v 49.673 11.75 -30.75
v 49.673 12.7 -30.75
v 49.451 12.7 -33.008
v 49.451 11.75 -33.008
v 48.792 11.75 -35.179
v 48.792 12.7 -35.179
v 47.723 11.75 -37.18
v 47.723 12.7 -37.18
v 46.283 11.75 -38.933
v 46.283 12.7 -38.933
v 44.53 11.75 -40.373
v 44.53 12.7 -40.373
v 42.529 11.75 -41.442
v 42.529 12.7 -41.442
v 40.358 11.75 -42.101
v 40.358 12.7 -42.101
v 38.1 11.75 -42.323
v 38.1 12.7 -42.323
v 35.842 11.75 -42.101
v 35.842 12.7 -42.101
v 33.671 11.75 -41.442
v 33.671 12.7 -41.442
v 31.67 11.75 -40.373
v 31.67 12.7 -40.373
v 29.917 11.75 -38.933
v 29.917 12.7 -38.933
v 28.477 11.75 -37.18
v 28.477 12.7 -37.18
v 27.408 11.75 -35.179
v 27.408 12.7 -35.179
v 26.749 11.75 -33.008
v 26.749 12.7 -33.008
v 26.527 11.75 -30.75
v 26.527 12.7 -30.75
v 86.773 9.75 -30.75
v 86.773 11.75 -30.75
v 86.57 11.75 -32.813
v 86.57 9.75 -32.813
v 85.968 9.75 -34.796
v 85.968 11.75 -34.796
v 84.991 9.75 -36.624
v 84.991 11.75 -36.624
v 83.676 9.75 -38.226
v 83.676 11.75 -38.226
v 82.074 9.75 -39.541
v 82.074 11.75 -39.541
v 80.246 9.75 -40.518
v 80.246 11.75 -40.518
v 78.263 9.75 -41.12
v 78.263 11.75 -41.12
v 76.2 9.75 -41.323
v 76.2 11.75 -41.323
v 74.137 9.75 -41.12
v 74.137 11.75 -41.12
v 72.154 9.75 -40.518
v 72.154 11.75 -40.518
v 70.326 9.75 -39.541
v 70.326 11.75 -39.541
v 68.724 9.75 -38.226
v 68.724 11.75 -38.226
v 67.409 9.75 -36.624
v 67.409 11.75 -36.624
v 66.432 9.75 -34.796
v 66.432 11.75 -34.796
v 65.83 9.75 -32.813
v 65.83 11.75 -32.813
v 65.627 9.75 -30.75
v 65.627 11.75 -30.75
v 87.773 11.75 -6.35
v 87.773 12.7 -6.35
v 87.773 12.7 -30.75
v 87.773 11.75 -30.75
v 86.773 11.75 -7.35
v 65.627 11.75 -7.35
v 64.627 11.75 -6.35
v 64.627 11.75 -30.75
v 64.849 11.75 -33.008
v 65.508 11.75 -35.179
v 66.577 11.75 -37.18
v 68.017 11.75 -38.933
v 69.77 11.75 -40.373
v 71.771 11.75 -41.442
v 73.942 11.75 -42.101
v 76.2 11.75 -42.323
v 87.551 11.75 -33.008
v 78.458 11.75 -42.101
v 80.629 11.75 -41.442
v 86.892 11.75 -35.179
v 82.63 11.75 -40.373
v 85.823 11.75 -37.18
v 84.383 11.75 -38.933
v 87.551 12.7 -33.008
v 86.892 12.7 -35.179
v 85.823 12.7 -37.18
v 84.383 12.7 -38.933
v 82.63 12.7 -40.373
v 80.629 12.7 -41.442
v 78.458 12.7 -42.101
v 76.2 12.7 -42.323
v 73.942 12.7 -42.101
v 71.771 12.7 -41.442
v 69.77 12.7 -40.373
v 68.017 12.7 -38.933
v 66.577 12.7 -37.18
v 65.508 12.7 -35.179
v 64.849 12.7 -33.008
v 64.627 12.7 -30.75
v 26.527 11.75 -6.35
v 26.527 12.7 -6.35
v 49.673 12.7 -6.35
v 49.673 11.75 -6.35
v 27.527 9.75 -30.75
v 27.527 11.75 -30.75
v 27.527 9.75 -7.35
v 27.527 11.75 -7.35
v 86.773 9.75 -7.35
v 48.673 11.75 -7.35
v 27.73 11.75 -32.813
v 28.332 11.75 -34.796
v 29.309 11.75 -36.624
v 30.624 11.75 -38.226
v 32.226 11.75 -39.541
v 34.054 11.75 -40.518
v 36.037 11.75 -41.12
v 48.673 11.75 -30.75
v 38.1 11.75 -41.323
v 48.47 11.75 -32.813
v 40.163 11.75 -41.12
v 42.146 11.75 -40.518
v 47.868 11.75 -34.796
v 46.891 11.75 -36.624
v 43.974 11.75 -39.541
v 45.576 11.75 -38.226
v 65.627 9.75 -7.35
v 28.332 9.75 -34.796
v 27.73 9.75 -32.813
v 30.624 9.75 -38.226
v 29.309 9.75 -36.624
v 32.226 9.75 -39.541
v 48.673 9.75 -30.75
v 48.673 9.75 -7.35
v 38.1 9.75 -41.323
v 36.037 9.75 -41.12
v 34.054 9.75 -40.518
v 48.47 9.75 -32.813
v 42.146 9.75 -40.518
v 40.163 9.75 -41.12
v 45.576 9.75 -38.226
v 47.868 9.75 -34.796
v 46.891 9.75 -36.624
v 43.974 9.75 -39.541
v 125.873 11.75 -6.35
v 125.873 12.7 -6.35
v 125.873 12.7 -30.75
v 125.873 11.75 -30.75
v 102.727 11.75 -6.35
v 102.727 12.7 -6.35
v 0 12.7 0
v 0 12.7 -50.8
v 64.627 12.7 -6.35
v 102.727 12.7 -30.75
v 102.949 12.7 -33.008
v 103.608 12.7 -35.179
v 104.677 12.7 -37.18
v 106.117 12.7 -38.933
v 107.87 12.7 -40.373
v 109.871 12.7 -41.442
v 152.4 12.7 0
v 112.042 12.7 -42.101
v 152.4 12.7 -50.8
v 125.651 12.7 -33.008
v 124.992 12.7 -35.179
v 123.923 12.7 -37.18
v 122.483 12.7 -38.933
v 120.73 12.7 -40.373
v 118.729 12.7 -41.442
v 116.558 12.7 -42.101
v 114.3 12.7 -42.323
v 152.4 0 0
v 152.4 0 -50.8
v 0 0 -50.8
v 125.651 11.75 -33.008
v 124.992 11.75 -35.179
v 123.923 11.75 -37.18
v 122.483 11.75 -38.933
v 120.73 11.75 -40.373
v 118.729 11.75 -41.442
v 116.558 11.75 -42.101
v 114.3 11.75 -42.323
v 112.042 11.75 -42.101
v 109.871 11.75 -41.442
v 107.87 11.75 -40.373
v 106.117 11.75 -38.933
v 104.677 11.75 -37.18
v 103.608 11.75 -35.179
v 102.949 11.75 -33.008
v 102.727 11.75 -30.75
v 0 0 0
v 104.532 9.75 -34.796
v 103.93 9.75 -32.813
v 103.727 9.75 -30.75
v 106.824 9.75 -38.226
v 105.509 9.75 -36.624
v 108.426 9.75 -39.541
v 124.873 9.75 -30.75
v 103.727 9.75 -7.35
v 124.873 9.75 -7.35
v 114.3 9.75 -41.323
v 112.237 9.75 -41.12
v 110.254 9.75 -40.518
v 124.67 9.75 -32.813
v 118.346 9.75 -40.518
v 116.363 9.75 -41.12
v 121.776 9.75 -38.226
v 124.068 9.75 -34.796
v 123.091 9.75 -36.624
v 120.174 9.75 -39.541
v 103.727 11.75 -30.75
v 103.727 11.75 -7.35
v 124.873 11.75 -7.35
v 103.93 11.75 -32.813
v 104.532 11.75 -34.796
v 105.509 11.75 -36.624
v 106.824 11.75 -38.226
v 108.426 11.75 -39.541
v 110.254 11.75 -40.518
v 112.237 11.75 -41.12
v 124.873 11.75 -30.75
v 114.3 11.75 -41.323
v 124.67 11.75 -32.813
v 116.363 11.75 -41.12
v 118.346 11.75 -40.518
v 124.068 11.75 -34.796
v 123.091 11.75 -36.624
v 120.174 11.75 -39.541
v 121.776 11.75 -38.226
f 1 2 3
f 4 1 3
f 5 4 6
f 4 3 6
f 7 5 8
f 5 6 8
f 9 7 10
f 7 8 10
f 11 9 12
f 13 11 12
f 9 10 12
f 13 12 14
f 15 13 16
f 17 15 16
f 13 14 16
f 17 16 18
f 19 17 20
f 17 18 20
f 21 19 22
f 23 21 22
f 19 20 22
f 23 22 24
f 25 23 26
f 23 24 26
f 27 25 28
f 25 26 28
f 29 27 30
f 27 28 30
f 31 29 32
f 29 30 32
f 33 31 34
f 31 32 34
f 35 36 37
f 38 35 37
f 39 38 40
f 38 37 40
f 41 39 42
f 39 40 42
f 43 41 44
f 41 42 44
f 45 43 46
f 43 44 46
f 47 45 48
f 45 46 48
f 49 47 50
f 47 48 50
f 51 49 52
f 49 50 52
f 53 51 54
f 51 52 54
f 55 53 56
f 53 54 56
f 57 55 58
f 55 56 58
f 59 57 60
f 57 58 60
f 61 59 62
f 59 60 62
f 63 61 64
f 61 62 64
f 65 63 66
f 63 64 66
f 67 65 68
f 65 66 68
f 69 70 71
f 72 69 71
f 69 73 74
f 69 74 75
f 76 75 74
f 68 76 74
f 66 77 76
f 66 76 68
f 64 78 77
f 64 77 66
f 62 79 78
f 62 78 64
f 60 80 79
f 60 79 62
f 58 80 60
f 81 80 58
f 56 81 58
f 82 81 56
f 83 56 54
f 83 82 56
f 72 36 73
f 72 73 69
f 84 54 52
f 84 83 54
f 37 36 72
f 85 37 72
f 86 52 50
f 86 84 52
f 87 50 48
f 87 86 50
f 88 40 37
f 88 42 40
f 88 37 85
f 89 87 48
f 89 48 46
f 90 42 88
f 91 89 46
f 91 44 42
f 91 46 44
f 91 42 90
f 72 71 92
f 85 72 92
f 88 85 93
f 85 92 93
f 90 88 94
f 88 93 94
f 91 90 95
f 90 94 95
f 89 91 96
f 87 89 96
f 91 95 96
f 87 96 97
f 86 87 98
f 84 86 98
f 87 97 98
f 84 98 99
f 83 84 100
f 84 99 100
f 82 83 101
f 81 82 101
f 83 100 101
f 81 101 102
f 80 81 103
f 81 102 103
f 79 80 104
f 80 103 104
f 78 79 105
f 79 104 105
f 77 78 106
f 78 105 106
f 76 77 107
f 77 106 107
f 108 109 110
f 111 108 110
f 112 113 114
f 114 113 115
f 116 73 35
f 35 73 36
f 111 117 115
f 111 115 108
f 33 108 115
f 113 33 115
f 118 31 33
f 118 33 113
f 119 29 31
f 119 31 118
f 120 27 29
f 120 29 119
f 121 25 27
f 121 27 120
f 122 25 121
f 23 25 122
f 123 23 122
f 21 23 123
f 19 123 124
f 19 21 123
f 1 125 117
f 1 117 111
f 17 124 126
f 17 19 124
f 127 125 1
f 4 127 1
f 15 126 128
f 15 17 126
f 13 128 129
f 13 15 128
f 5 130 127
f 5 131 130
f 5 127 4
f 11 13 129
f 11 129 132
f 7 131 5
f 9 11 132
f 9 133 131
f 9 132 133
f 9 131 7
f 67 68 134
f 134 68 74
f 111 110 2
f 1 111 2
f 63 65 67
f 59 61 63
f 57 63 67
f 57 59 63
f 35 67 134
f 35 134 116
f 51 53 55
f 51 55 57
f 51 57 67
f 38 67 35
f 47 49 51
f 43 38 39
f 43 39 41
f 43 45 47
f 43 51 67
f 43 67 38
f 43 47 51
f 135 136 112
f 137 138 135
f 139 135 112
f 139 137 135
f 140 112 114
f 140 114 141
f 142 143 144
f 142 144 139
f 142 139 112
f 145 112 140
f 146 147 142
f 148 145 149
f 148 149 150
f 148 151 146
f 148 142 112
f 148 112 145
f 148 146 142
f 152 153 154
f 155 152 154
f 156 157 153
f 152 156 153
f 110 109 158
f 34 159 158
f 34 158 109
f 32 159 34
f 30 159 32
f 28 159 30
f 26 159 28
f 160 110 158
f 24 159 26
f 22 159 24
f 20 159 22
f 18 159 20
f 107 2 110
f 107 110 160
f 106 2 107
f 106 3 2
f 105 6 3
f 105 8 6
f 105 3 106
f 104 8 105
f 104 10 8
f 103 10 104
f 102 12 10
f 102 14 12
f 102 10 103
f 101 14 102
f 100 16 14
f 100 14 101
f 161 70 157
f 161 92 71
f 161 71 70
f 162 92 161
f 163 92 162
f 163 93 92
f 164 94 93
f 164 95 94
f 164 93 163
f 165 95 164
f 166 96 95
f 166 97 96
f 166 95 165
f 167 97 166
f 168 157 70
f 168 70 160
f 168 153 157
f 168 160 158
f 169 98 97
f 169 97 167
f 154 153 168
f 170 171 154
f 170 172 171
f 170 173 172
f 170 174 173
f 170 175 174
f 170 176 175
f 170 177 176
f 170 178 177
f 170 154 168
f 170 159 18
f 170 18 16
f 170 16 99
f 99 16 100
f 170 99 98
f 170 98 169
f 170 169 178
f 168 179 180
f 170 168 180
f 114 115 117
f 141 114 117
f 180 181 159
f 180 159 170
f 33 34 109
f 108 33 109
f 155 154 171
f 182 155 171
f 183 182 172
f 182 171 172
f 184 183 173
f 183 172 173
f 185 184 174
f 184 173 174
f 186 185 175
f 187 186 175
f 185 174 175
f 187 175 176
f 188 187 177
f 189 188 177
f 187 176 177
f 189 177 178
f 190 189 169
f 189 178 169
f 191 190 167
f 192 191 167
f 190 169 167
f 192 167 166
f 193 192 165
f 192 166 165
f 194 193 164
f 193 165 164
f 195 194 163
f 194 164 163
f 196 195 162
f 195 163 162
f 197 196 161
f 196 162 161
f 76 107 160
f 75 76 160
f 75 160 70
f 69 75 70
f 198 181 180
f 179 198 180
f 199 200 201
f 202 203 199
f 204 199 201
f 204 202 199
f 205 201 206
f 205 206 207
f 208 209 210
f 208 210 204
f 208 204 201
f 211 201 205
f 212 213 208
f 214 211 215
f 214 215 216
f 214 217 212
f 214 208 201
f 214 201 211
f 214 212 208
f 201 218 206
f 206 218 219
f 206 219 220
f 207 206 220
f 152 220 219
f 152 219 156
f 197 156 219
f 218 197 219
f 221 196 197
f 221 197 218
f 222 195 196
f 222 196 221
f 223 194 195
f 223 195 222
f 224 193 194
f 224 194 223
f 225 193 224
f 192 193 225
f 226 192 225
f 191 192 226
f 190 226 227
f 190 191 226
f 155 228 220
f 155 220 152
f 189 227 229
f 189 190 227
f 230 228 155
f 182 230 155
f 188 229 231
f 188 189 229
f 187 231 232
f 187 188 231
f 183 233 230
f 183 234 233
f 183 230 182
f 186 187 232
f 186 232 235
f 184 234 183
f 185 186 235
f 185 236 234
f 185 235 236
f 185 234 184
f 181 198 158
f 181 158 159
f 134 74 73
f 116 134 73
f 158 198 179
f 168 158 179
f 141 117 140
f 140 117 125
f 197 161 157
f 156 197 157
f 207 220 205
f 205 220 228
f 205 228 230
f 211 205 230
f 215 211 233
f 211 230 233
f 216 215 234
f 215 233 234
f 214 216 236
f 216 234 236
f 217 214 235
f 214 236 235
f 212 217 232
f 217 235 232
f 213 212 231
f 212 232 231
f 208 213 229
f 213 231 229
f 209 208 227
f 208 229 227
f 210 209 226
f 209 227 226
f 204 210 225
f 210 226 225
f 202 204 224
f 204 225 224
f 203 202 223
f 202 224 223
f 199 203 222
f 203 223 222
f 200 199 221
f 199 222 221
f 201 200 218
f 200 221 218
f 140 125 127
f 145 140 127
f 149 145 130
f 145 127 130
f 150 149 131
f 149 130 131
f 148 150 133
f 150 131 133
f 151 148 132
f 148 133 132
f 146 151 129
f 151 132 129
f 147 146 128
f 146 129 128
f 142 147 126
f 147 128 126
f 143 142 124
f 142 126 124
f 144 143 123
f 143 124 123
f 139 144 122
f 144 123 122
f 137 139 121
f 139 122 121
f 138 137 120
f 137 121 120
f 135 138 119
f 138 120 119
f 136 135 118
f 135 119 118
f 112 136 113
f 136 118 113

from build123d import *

# Parameters (mm, degrees)
SKETCH1_W           = 152.4
SKETCH1_H           = 50.8
BOSS_EXTRUDE1_DEPTH = 12.7
CUT_EXTRUDE1_DEPTH  = 0.95
CUT_EXTRUDE2_DEPTH  = 2
LPATTERN1_COUNT     = 2
LPATTERN1_PITCH     = 38.1
LPATTERN1_COL_COUNT = 2
LPATTERN1_COL_PITCH = 38.1


with BuildPart() as part:
    # Sketch1 → Boss-Extrude1 (new body)
    with BuildSketch(Plane(origin=(0, 0, 0), x_dir=(1, 0, 0), z_dir=(0, 1, 0))):
        with Locations((76.2, 25.4)):
            Rectangle(SKETCH1_W, SKETCH1_H)
    extrude(amount=BOSS_EXTRUDE1_DEPTH)

    # Sketch2 → Cut-Extrude1 (cut)
    with BuildSketch(Plane(origin=(0, 12.7, 0), x_dir=(1, 0, 0), z_dir=(0, 1, 0))):
        with BuildLine():
            Line((64.626998, 30.75), (64.626998, 6.35))
            Line((64.626998, 6.35), (87.773002, 6.35))
            Line((87.773002, 6.35), (87.773002, 30.75))
            ThreePointArc((87.773002, 30.75), (76.2, 42.323002), (64.626998, 30.75))
        make_face()
    cut_extrude1 = extrude(amount=-CUT_EXTRUDE1_DEPTH, mode=Mode.SUBTRACT)

    # Sketch3 → Cut-Extrude2 (cut)
    with BuildSketch(Plane(origin=(0, 11.75, 0), x_dir=(1, 0, 0), z_dir=(0, 1, 0))):
        with BuildLine():
            Line((65.626998, 30.75), (65.626998, 7.35))
            Line((65.626998, 7.35), (86.773002, 7.35))
            Line((86.773002, 7.35), (86.773002, 30.75))
            ThreePointArc((86.773002, 30.75), (76.2, 41.323002), (65.626998, 30.75))
        make_face()
    cut_extrude2 = extrude(amount=-CUT_EXTRUDE2_DEPTH, mode=Mode.SUBTRACT)

    # LPattern1: Cut-Extrude1, Cut-Extrude2 ×2
    with Locations(*[(i * LPATTERN1_PITCH, 0, 0) for i in range(1, LPATTERN1_COUNT)]):
        add(cut_extrude1, mode=Mode.SUBTRACT)
        add(cut_extrude2, mode=Mode.SUBTRACT)

    # LPattern1 col: Cut-Extrude1, Cut-Extrude2 ×2
    with Locations(*[(-i * LPATTERN1_COL_PITCH, 0, 0) for i in range(1, LPATTERN1_COL_COUNT)]):
        add(cut_extrude1, mode=Mode.SUBTRACT)
        add(cut_extrude2, mode=Mode.SUBTRACT)


solid = part.part
